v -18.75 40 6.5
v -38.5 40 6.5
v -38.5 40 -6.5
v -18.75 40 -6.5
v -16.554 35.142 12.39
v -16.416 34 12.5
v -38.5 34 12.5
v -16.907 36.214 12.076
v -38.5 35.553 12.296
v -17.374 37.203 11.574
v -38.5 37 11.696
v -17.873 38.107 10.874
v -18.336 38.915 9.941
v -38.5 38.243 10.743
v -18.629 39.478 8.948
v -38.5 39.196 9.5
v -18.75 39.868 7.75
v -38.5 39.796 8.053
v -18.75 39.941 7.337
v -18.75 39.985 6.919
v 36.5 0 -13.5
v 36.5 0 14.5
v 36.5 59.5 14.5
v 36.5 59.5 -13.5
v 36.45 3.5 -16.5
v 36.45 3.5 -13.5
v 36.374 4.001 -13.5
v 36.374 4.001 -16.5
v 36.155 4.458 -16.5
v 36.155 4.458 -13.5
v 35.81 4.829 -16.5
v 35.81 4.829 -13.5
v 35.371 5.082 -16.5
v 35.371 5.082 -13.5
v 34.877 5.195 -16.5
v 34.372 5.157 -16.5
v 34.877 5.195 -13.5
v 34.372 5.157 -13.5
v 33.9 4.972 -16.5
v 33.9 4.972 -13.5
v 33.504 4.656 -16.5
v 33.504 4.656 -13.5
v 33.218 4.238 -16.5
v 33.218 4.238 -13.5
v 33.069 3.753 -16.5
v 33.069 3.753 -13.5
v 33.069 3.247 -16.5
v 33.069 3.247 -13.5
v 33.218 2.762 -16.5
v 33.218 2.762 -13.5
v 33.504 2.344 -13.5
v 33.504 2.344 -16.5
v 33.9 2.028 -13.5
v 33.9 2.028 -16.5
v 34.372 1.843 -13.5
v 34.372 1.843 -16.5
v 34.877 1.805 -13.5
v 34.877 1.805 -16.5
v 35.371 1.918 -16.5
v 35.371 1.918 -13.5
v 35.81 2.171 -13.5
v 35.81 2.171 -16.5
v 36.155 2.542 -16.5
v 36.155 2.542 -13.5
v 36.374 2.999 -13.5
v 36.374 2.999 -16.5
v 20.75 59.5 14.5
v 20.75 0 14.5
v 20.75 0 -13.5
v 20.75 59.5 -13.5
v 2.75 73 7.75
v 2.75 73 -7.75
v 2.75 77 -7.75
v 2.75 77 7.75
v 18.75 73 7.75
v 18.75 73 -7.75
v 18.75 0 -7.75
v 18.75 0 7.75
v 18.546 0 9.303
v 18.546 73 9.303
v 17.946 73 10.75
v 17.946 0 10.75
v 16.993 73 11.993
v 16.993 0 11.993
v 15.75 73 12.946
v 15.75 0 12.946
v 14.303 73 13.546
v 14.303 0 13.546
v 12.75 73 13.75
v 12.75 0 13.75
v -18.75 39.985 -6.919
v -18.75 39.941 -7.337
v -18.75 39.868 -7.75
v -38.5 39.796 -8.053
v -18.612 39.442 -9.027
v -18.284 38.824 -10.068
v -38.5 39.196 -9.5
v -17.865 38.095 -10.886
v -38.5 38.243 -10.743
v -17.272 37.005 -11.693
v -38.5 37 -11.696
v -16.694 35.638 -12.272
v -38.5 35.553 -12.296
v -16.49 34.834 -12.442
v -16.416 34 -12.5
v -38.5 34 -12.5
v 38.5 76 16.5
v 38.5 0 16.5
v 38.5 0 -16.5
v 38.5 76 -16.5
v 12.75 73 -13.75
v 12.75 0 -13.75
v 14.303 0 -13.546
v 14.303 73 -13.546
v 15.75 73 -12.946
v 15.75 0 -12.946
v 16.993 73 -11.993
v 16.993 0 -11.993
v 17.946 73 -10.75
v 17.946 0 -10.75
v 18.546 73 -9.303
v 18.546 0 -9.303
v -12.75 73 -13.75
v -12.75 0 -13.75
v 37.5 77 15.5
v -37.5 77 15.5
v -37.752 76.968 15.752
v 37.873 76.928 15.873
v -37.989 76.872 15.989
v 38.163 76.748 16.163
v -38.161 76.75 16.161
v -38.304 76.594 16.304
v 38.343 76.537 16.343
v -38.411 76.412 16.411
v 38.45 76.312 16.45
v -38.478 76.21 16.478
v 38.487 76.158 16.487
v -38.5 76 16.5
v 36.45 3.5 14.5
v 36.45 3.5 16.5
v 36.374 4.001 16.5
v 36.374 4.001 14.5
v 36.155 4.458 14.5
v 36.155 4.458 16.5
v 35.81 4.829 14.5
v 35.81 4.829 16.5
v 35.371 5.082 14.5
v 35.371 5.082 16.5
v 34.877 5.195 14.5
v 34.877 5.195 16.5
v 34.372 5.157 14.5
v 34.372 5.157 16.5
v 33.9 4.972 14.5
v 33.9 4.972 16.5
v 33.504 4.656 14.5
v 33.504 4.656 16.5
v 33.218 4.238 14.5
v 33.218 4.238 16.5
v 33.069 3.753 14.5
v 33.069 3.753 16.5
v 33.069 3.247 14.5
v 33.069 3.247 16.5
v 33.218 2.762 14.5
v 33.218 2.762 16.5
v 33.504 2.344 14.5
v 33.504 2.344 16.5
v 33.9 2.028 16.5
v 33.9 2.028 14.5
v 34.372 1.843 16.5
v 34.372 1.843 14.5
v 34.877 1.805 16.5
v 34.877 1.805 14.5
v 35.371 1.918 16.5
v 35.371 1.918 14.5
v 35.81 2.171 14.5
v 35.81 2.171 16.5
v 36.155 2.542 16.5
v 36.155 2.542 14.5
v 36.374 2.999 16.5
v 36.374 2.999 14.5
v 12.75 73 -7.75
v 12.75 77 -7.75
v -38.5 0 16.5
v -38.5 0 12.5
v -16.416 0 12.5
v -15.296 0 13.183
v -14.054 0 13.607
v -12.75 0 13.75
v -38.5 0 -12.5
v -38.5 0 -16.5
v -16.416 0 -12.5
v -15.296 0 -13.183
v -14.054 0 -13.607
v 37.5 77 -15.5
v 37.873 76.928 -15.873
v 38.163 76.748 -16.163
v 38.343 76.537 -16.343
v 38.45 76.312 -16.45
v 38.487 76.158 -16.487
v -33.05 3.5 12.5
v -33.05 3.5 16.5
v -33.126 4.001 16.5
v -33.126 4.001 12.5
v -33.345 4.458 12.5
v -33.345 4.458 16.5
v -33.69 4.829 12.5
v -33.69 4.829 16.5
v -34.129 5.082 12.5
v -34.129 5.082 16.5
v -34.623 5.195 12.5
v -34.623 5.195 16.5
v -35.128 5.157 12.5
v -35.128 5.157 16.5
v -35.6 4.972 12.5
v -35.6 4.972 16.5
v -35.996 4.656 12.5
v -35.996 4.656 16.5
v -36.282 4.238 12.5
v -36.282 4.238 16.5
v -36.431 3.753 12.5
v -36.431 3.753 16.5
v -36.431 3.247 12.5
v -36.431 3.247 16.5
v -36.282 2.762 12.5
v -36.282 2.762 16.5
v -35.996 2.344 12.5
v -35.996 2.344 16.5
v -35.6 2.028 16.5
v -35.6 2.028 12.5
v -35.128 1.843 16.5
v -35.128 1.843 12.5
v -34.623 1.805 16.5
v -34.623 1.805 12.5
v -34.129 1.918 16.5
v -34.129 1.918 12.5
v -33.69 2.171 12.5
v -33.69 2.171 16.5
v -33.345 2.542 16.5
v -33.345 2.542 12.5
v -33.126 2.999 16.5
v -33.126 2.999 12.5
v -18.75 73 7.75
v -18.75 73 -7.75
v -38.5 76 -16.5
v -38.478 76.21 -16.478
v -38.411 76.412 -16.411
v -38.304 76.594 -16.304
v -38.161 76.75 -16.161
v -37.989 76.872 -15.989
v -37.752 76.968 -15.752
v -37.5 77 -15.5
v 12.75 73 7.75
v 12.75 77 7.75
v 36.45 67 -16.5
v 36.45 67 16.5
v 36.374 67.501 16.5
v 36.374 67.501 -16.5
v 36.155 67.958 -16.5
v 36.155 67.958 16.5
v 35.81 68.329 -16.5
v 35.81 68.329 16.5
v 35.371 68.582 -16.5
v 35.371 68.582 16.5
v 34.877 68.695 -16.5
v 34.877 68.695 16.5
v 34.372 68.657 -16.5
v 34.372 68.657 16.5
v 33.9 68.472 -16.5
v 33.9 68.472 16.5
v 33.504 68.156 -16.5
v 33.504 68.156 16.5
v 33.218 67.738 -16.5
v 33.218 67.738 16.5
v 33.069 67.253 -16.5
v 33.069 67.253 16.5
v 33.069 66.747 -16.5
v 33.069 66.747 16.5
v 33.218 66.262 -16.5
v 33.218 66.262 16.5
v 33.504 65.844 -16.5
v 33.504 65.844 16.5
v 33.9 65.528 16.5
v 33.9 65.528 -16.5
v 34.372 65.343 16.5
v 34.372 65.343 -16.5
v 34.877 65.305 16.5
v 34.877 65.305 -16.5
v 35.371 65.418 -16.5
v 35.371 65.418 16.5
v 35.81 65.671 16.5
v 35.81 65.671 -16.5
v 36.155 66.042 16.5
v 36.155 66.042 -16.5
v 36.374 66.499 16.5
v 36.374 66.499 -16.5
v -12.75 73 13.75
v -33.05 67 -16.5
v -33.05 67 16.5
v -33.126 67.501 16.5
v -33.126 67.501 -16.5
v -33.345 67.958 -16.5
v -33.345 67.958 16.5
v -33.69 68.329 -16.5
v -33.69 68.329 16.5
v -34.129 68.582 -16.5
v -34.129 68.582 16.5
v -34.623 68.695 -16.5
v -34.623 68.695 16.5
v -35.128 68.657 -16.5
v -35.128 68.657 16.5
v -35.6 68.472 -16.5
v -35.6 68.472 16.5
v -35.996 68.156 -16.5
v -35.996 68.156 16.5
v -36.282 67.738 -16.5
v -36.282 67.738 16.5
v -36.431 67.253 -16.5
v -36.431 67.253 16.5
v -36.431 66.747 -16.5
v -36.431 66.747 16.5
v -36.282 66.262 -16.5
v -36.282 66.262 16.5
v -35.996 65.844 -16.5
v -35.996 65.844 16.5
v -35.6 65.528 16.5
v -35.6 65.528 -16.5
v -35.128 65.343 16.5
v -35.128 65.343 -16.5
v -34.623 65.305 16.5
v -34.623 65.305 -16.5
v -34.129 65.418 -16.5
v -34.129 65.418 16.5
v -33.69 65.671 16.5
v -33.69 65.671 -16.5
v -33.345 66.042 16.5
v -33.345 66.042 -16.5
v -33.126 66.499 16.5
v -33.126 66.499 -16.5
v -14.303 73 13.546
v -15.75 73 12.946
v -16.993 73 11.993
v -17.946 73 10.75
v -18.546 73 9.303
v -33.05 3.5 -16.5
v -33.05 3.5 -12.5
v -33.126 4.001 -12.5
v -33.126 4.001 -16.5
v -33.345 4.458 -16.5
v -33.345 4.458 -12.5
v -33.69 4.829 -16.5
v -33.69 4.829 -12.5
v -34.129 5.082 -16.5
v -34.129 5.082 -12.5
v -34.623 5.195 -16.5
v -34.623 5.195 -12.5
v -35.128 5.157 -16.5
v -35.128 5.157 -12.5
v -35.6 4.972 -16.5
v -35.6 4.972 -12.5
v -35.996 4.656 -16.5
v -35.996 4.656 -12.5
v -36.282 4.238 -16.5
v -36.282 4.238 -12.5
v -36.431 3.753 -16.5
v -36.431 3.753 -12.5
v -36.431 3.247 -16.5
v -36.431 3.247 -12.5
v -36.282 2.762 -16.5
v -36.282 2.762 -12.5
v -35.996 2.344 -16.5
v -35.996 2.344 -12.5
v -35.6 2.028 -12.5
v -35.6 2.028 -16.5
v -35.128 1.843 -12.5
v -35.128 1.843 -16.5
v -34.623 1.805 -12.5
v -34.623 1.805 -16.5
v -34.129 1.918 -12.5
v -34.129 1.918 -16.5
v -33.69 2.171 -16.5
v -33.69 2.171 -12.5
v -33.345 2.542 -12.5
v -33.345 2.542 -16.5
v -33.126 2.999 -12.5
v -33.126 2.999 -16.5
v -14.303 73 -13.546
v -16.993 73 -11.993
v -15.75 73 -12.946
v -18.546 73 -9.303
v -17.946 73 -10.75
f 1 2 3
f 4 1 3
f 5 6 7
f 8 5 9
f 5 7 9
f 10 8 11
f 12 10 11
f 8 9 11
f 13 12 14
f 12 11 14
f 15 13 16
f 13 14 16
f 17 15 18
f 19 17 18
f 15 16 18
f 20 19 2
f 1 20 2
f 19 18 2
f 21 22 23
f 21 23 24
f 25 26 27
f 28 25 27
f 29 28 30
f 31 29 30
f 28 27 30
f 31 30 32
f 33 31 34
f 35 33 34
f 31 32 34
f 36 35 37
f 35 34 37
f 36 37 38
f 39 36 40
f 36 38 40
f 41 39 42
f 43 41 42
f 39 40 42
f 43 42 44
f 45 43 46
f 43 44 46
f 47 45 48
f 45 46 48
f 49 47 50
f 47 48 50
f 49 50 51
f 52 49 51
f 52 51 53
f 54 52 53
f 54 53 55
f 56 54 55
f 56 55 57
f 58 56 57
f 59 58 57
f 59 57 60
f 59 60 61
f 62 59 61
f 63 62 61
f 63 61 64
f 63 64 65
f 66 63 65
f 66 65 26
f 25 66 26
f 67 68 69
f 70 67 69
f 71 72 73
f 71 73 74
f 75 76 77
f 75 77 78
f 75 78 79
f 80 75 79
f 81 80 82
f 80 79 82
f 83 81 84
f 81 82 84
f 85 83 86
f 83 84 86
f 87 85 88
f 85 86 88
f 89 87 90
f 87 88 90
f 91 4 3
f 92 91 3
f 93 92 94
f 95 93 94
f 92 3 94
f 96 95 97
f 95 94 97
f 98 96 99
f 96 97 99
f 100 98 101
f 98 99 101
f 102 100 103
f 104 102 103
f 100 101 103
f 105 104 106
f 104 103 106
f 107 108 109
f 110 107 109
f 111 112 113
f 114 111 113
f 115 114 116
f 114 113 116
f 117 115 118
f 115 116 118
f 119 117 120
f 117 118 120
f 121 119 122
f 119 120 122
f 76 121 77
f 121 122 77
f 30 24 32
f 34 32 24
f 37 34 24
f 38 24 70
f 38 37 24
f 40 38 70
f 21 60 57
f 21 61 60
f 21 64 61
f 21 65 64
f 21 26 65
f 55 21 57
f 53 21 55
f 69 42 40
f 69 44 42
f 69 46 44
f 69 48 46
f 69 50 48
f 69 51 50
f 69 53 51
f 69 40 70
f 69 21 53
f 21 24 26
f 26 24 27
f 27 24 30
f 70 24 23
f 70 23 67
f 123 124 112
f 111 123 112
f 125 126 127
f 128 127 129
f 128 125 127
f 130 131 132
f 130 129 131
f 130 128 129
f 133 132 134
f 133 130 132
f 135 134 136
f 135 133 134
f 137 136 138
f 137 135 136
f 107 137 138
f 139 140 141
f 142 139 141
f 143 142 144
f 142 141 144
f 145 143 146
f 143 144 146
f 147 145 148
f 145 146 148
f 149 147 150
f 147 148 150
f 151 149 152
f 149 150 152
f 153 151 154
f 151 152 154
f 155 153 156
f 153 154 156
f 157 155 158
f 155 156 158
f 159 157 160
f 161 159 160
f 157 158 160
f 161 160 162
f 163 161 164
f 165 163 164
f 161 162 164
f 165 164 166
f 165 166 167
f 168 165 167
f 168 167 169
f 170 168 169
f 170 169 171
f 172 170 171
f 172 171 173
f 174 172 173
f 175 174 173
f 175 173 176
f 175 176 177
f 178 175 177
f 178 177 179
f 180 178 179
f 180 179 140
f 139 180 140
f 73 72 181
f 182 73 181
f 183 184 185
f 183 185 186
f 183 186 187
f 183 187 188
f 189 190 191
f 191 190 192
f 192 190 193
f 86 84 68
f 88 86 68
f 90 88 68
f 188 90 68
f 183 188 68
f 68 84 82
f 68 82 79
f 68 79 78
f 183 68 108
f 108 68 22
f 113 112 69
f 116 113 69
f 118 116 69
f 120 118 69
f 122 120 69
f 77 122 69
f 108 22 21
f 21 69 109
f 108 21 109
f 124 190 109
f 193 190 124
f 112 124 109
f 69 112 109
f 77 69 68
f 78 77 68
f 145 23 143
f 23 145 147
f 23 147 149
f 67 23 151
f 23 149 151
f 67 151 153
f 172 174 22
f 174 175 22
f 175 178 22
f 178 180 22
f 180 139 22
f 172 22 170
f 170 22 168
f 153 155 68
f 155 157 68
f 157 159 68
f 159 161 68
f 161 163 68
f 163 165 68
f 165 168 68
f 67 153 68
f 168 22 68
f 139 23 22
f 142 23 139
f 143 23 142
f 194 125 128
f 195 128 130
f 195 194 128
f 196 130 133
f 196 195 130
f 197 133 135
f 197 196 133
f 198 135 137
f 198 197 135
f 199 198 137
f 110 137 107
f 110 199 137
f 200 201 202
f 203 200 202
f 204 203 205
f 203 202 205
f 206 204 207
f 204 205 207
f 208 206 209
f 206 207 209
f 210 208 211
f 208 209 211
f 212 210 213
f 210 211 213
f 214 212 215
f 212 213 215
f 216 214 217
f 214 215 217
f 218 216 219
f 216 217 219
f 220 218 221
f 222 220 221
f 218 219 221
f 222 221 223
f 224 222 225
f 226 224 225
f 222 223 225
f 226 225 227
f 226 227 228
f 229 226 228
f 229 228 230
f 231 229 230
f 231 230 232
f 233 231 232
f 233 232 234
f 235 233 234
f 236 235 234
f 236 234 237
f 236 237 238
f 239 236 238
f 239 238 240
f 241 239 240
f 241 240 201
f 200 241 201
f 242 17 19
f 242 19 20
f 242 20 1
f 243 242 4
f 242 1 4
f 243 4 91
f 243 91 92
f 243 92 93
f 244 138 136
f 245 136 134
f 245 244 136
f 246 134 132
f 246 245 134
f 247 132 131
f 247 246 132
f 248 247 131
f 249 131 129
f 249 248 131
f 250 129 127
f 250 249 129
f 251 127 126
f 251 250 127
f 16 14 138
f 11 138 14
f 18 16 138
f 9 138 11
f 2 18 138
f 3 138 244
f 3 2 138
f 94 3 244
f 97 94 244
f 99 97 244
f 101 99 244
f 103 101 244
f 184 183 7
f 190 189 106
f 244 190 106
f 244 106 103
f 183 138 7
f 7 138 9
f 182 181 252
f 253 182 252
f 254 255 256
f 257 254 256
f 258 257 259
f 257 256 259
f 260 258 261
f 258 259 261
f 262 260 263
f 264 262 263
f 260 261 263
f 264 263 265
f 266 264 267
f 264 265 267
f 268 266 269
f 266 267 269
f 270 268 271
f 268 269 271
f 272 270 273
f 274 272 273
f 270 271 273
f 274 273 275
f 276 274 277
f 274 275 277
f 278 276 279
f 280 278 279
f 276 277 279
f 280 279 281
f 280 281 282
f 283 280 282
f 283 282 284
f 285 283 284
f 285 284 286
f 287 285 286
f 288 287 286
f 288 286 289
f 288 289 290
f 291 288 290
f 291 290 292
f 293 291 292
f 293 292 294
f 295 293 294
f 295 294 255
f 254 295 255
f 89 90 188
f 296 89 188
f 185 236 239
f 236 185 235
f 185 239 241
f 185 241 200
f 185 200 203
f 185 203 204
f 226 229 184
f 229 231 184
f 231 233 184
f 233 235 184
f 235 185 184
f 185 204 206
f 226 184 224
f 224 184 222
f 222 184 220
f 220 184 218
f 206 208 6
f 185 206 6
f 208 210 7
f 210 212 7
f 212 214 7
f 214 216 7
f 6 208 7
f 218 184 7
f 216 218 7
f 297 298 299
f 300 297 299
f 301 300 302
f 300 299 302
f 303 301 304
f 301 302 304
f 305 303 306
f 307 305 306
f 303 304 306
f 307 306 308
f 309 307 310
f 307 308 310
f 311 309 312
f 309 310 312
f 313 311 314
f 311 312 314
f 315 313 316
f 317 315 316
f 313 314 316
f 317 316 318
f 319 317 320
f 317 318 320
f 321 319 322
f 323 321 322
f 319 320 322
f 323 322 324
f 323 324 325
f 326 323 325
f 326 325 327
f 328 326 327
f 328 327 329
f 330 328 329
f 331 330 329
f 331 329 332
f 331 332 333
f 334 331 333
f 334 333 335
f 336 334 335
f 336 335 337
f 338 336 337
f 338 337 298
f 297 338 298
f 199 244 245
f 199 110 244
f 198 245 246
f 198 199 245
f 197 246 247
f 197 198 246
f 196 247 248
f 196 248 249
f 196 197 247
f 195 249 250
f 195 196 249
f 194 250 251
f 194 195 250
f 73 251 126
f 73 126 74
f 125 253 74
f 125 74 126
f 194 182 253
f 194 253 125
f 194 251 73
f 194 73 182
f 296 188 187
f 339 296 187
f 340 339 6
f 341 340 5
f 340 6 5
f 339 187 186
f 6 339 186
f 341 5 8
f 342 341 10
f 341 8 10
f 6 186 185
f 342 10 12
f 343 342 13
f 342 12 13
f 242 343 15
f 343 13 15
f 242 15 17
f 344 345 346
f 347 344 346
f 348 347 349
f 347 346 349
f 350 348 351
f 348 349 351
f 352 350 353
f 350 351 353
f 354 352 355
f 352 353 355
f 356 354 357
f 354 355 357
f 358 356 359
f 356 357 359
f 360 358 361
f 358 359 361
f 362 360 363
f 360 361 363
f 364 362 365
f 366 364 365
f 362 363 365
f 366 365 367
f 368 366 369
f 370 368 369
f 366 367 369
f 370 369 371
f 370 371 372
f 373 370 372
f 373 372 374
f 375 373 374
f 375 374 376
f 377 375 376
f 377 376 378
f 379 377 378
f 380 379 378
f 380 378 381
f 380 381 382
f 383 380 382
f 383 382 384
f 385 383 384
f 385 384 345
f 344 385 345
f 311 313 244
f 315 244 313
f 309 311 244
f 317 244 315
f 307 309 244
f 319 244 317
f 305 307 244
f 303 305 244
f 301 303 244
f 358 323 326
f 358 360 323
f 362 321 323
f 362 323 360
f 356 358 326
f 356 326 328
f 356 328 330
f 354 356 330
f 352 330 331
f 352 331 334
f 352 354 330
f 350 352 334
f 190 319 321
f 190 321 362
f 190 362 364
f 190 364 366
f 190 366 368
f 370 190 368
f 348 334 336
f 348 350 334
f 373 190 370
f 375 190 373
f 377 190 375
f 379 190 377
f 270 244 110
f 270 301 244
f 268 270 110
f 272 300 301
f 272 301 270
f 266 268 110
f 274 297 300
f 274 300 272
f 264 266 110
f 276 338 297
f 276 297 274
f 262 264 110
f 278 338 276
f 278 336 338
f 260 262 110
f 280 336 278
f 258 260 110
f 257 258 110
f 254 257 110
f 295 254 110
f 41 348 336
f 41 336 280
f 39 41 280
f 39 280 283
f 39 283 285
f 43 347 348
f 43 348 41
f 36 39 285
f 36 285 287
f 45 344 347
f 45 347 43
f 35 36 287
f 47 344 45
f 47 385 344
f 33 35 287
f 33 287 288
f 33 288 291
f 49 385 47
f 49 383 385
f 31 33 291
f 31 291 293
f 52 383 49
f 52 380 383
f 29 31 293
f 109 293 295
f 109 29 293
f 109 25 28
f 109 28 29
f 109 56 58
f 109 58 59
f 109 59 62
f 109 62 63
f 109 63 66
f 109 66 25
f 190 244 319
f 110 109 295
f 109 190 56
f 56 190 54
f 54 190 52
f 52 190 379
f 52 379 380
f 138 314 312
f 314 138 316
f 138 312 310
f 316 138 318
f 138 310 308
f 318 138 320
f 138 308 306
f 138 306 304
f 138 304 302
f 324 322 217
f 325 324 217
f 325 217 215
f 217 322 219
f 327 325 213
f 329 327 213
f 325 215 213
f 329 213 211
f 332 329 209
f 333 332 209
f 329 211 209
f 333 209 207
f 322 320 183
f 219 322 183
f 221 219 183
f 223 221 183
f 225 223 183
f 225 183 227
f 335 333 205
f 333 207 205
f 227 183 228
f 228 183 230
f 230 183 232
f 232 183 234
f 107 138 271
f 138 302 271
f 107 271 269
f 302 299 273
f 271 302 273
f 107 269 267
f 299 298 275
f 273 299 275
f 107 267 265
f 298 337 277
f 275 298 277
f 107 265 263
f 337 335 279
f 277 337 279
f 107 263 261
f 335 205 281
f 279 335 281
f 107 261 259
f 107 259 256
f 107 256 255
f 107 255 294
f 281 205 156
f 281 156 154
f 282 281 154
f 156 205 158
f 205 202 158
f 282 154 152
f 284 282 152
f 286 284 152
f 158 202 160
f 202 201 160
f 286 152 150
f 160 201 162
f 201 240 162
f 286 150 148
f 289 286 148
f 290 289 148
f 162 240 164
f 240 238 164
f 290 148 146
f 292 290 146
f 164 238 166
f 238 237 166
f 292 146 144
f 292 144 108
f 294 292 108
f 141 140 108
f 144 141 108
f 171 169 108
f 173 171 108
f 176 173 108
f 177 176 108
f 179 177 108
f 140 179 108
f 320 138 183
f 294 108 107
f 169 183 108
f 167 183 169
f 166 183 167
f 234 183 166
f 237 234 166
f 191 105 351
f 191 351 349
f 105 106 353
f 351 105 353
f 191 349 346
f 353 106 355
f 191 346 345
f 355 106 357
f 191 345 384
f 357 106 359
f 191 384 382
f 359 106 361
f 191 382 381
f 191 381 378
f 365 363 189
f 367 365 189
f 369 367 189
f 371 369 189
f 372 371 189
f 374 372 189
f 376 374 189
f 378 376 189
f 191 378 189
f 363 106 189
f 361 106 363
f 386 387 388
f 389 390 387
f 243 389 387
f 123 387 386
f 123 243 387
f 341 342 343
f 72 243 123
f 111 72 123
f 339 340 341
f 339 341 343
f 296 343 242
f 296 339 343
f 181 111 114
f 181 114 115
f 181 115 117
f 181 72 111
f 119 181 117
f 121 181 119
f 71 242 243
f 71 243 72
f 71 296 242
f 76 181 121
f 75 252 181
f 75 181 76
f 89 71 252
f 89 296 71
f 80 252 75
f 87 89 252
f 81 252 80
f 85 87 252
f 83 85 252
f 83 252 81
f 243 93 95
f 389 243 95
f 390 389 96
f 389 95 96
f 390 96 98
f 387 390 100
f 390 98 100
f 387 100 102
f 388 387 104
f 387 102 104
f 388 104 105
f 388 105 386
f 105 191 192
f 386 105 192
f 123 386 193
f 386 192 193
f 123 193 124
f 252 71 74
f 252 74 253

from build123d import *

# Parameters (mm, degrees)
SKETCH_1_W          = 77
SKETCH_1_H          = 33
EXTRUDE_1_DEPTH     = 77
CUT_EXTRUDE_1_DEPTH = 73
SKETCH_3_R          = 1.7
CUT_EXTRUDE_2_DEPTH = 93.196800378
CUT_EXTRUDE_3_REACH = 112.137
SKETCH_5_W          = 10
SKETCH_5_H          = 15.5
CUT_EXTRUDE_4_DEPTH = 85.163531427
SKETCH_6_W          = 15.75
SKETCH_6_H          = 28
CUT_EXTRUDE_5_DEPTH = 59.5
FILLET_1_R          = 1


with BuildPart() as part:
    # ｽｹｯﾁ1 → ﾎﾞｽ - 押し出し1 (new body)
    with BuildSketch(Plane(origin=(0, 0, 0), x_dir=(1, 0, 0), z_dir=(0, 1, 0))):
        Rectangle(SKETCH_1_W, SKETCH_1_H)
    extrude(amount=EXTRUDE_1_DEPTH)

    # ｽｹｯﾁ2 → ｶｯﾄ - 押し出し1 (cut)
    with BuildSketch(Plane.XZ):
        with BuildLine():
            Line((12.75, 13.75), (-12.75, 13.75))
            ThreePointArc((-12.75, 13.75), (-16.992640687, 11.992640687), (-18.75, 7.75))
            Line((-18.75, 7.75), (-18.75, -7.75))
            ThreePointArc((-18.75, -7.75), (-16.992640687, -11.992640687), (-12.75, -13.75))
            Line((-12.75, -13.75), (12.75, -13.75))
            ThreePointArc((12.75, -13.75), (16.992640687, -11.992640687), (18.75, -7.75))
            Line((18.75, -7.75), (18.75, 7.75))
            ThreePointArc((18.75, 7.75), (16.992640687, 11.992640687), (12.75, 13.75))
        make_face()
    extrude(amount=-CUT_EXTRUDE_1_DEPTH, mode=Mode.SUBTRACT)

    # ｽｹｯﾁ3 → ｶｯﾄ - 押し出し2 (cut, through all)
    with BuildSketch(Plane.XY.offset(16.5)):
        with Locations((34.75, 3.5)):
            Circle(SKETCH_3_R)
        with Locations((34.75, 67)):
            Circle(SKETCH_3_R)
        with Locations((-34.75, 67)):
            Circle(SKETCH_3_R)
        with Locations((-34.75, 3.5)):
            Circle(SKETCH_3_R)
    extrude(amount=-CUT_EXTRUDE_2_DEPTH, mode=Mode.SUBTRACT)

    # ｽｹｯﾁ4 → ｶｯﾄ - 押し出し3 (cut, up to next)
    with BuildSketch(Plane.ZY.offset(38.5), mode=Mode.PRIVATE) as cut_extrude_3_sk1:
        with BuildLine():
            Line((6.5, 40), (-6.5, 40))
            ThreePointArc((-6.5, 40), (-10.742640687, 38.242640687), (-12.5, 34))
            Line((-12.5, 34), (-12.5, 0))
            Line((-12.5, 0), (12.5, 0))
            Line((12.5, 0), (12.5, 34))
            ThreePointArc((12.5, 34), (10.742640687, 38.242640687), (6.5, 40))
        make_face()
    cut_extrude_3_tool1 = extrude(cut_extrude_3_sk1.sketch, amount=-CUT_EXTRUDE_3_REACH, mode=Mode.PRIVATE) & part.part
    add(cut_extrude_3_tool1.solids().sort_by_distance((-38.5, 19.707157, 0))[0], mode=Mode.SUBTRACT)

    # ｽｹｯﾁ5 → ｶｯﾄ - 押し出し4 (cut, through all)
    with BuildSketch(Plane.XZ.offset(-73)):
        with Locations((7.75, 0)):
            Rectangle(SKETCH_5_W, SKETCH_5_H)
    extrude(amount=-CUT_EXTRUDE_4_DEPTH, mode=Mode.SUBTRACT)

    # ｽｹｯﾁ6 → ｶｯﾄ - 押し出し5 (cut)
    with BuildSketch(Plane(origin=(0, 0, 0), x_dir=(-1, 0, 0), z_dir=(0, -1, 0))):
        with Locations((-28.625, -0.5)):
            Rectangle(SKETCH_6_W, SKETCH_6_H)
    extrude(amount=-CUT_EXTRUDE_5_DEPTH, mode=Mode.SUBTRACT)

    # ﾌｨﾚｯﾄ1
    fillet_1_edges = [part.edges().sort_by_distance(p)[0] for p in [
        (38.5, 77, 0),
        (0, 77, -16.5),
        (-38.5, 77, 0),
        (0, 77, 16.5),
    ]]
    fillet(fillet_1_edges, radius=FILLET_1_R)


solid = part.part
